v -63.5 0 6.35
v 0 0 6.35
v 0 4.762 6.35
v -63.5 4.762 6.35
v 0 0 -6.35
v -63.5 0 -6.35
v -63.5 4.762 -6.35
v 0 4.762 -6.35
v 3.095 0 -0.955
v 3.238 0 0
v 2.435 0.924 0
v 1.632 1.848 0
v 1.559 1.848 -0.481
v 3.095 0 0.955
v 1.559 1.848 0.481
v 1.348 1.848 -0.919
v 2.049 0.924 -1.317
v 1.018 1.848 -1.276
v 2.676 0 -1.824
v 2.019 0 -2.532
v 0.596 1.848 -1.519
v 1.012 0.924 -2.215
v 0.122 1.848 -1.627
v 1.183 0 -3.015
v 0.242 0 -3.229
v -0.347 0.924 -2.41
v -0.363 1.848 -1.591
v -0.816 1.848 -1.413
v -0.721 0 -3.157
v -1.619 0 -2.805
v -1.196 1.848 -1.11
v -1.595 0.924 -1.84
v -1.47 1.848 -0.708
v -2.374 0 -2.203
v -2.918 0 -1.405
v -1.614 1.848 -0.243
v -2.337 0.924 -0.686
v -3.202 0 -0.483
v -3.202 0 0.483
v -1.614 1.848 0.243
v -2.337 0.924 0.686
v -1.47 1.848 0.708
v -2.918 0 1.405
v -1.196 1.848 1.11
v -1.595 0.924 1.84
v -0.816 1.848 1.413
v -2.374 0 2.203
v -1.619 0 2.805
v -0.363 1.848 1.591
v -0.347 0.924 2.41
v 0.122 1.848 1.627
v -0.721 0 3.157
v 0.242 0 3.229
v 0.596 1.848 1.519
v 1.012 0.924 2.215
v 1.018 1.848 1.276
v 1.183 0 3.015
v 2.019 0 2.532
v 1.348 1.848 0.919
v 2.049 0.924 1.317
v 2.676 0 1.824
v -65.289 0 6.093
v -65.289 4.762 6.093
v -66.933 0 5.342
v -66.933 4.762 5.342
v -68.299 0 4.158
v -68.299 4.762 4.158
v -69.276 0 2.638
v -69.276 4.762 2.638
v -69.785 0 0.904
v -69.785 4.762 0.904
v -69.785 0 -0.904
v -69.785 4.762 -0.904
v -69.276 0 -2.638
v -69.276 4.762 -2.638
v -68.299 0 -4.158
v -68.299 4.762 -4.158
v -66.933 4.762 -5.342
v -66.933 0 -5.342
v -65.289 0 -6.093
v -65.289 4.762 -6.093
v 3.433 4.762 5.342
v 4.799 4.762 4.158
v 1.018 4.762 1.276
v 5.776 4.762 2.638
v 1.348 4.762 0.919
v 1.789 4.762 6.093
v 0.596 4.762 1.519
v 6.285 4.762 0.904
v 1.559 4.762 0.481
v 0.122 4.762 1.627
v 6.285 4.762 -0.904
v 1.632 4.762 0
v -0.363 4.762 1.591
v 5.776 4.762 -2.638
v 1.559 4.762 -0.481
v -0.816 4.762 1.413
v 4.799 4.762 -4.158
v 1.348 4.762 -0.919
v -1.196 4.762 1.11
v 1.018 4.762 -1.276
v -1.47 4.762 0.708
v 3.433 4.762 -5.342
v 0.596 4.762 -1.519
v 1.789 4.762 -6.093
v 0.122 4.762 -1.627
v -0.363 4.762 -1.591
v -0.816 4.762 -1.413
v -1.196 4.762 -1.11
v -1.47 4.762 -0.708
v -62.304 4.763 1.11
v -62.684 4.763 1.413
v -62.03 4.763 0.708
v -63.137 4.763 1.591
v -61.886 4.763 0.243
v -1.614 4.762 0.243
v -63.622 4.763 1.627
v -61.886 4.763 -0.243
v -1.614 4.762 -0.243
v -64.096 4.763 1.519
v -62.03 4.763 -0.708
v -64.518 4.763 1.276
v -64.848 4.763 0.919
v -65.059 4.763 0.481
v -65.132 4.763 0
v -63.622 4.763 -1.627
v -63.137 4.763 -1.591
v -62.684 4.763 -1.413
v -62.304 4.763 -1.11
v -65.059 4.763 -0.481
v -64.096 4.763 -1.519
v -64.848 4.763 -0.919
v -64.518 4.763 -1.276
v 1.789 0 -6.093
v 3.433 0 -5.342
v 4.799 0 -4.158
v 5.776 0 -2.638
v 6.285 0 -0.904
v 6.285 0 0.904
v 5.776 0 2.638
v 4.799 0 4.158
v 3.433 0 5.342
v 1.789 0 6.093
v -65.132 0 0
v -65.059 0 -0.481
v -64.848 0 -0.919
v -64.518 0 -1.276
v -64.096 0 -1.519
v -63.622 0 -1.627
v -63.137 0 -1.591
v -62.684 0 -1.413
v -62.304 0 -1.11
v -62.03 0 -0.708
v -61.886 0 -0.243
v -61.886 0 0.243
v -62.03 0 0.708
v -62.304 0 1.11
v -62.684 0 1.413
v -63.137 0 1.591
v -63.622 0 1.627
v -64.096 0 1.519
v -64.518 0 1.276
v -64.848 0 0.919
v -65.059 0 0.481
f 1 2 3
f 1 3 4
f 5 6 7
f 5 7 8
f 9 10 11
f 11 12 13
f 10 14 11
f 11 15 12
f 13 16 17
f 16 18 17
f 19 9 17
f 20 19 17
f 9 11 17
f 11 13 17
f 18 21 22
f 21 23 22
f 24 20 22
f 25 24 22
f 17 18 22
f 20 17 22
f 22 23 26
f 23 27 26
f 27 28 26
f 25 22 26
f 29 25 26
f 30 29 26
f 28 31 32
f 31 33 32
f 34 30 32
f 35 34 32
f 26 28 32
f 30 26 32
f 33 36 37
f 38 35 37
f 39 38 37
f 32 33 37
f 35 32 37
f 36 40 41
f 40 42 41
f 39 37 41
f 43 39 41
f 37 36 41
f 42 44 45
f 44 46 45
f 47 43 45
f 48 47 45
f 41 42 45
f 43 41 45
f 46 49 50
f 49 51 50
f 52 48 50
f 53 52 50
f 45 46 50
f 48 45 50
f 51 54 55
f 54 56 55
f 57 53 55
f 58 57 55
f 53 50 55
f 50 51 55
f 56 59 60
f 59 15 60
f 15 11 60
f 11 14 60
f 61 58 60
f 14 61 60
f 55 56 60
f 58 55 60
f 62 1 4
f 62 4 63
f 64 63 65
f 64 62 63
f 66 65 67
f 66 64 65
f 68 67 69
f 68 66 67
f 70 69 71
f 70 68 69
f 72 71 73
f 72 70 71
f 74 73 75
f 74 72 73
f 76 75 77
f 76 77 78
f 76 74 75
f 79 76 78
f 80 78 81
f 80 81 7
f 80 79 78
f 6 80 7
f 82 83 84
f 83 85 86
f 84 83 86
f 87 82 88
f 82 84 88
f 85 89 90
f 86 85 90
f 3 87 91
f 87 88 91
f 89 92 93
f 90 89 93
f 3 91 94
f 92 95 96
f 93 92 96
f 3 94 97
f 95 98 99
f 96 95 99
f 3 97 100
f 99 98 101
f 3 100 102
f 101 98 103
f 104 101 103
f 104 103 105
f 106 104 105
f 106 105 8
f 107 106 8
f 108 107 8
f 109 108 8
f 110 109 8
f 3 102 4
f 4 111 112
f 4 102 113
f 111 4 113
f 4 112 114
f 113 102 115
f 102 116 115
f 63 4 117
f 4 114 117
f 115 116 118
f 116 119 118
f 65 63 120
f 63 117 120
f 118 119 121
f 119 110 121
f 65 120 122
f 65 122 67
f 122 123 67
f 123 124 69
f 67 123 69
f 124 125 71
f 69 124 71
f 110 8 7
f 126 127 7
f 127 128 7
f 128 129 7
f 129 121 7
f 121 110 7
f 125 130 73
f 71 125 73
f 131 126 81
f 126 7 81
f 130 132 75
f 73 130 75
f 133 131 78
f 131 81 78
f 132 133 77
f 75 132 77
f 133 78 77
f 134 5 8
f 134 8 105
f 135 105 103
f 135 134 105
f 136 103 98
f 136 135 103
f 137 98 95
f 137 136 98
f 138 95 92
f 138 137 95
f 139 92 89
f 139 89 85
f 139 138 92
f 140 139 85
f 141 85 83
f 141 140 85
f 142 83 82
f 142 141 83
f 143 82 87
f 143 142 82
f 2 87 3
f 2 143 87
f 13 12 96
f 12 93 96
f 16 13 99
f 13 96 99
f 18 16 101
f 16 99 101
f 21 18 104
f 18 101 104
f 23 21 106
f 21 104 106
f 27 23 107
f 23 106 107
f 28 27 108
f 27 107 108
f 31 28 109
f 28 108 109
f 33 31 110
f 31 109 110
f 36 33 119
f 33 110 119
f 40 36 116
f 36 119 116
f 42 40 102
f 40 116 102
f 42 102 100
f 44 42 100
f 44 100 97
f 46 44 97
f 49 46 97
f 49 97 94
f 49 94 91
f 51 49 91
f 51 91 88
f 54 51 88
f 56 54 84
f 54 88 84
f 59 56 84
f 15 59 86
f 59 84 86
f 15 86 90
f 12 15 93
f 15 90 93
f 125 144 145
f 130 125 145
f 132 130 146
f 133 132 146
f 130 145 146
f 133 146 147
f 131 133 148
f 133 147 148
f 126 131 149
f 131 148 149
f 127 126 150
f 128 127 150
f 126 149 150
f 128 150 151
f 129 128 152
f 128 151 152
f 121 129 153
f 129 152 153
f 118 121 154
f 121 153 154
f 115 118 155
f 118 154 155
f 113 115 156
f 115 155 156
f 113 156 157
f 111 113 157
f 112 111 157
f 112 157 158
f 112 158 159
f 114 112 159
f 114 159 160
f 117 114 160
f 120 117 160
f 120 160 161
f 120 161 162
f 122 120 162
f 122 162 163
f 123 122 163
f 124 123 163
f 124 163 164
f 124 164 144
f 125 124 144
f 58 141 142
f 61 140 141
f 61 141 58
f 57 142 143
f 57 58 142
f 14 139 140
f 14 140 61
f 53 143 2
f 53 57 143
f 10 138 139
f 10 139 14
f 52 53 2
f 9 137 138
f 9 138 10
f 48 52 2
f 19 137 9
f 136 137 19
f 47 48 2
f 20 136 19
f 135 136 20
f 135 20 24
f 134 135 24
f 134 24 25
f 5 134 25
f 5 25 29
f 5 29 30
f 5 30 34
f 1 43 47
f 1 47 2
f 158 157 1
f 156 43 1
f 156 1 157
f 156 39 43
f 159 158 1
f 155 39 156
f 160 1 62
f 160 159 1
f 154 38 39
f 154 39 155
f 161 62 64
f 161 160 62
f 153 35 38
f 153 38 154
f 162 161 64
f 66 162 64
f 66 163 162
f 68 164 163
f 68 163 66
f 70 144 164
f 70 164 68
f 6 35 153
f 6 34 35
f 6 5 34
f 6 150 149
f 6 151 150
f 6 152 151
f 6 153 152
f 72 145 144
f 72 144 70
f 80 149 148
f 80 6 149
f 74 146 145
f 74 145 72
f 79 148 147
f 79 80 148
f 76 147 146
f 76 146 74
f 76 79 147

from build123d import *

# Parameters (mm, degrees)
BOSS_EXTRUDE2_DEPTH                               = 4.7625
F_4_CLEARANCE_HOLE1_D                             = 3.2639
CSK_FOR_4_FLAT_HEAD_SOCKET_CAP_SCREW2_D           = 3.2639
CSK_FOR_4_FLAT_HEAD_SOCKET_CAP_SCREW2_CSINK_D     = 6.477
CSK_FOR_4_FLAT_HEAD_SOCKET_CAP_SCREW2_CSINK_ANGLE = 82


with BuildPart() as part:
    # Sketch1 → Boss-Extrude2 (new body)
    with BuildSketch(Plane(origin=(0, 0, 0), x_dir=(1, 0, 0), z_dir=(0, 1, 0))):
        with BuildLine():
            Line((-63.5, 6.35), (0, 6.35))
            ThreePointArc((0, 6.35), (6.35, 0), (0, -6.35))
            Line((0, -6.35), (-63.5, -6.35))
            ThreePointArc((-63.5, -6.35), (-69.85, 0), (-63.5, 6.35))
        make_face()
    extrude(amount=BOSS_EXTRUDE2_DEPTH)

    # #4 Clearance Hole1 (through all)
    with Locations(Plane(origin=(0, 4.7625, 0), x_dir=(1, 0, 0), z_dir=(0, 1, 0))):
        with Locations((-63.5, 0)):
            Hole(F_4_CLEARANCE_HOLE1_D / 2)

    # CSK for #4 Flat Head Socket Cap Screw2 (through all)
    with Locations(Plane(origin=(0, 0, 0), x_dir=(-1, 0, 0), z_dir=(0, -1, 0))):
        with Locations((0, 0)):
            CounterSinkHole(CSK_FOR_4_FLAT_HEAD_SOCKET_CAP_SCREW2_D / 2, CSK_FOR_4_FLAT_HEAD_SOCKET_CAP_SCREW2_CSINK_D / 2, counter_sink_angle=CSK_FOR_4_FLAT_HEAD_SOCKET_CAP_SCREW2_CSINK_ANGLE)


solid = part.part
